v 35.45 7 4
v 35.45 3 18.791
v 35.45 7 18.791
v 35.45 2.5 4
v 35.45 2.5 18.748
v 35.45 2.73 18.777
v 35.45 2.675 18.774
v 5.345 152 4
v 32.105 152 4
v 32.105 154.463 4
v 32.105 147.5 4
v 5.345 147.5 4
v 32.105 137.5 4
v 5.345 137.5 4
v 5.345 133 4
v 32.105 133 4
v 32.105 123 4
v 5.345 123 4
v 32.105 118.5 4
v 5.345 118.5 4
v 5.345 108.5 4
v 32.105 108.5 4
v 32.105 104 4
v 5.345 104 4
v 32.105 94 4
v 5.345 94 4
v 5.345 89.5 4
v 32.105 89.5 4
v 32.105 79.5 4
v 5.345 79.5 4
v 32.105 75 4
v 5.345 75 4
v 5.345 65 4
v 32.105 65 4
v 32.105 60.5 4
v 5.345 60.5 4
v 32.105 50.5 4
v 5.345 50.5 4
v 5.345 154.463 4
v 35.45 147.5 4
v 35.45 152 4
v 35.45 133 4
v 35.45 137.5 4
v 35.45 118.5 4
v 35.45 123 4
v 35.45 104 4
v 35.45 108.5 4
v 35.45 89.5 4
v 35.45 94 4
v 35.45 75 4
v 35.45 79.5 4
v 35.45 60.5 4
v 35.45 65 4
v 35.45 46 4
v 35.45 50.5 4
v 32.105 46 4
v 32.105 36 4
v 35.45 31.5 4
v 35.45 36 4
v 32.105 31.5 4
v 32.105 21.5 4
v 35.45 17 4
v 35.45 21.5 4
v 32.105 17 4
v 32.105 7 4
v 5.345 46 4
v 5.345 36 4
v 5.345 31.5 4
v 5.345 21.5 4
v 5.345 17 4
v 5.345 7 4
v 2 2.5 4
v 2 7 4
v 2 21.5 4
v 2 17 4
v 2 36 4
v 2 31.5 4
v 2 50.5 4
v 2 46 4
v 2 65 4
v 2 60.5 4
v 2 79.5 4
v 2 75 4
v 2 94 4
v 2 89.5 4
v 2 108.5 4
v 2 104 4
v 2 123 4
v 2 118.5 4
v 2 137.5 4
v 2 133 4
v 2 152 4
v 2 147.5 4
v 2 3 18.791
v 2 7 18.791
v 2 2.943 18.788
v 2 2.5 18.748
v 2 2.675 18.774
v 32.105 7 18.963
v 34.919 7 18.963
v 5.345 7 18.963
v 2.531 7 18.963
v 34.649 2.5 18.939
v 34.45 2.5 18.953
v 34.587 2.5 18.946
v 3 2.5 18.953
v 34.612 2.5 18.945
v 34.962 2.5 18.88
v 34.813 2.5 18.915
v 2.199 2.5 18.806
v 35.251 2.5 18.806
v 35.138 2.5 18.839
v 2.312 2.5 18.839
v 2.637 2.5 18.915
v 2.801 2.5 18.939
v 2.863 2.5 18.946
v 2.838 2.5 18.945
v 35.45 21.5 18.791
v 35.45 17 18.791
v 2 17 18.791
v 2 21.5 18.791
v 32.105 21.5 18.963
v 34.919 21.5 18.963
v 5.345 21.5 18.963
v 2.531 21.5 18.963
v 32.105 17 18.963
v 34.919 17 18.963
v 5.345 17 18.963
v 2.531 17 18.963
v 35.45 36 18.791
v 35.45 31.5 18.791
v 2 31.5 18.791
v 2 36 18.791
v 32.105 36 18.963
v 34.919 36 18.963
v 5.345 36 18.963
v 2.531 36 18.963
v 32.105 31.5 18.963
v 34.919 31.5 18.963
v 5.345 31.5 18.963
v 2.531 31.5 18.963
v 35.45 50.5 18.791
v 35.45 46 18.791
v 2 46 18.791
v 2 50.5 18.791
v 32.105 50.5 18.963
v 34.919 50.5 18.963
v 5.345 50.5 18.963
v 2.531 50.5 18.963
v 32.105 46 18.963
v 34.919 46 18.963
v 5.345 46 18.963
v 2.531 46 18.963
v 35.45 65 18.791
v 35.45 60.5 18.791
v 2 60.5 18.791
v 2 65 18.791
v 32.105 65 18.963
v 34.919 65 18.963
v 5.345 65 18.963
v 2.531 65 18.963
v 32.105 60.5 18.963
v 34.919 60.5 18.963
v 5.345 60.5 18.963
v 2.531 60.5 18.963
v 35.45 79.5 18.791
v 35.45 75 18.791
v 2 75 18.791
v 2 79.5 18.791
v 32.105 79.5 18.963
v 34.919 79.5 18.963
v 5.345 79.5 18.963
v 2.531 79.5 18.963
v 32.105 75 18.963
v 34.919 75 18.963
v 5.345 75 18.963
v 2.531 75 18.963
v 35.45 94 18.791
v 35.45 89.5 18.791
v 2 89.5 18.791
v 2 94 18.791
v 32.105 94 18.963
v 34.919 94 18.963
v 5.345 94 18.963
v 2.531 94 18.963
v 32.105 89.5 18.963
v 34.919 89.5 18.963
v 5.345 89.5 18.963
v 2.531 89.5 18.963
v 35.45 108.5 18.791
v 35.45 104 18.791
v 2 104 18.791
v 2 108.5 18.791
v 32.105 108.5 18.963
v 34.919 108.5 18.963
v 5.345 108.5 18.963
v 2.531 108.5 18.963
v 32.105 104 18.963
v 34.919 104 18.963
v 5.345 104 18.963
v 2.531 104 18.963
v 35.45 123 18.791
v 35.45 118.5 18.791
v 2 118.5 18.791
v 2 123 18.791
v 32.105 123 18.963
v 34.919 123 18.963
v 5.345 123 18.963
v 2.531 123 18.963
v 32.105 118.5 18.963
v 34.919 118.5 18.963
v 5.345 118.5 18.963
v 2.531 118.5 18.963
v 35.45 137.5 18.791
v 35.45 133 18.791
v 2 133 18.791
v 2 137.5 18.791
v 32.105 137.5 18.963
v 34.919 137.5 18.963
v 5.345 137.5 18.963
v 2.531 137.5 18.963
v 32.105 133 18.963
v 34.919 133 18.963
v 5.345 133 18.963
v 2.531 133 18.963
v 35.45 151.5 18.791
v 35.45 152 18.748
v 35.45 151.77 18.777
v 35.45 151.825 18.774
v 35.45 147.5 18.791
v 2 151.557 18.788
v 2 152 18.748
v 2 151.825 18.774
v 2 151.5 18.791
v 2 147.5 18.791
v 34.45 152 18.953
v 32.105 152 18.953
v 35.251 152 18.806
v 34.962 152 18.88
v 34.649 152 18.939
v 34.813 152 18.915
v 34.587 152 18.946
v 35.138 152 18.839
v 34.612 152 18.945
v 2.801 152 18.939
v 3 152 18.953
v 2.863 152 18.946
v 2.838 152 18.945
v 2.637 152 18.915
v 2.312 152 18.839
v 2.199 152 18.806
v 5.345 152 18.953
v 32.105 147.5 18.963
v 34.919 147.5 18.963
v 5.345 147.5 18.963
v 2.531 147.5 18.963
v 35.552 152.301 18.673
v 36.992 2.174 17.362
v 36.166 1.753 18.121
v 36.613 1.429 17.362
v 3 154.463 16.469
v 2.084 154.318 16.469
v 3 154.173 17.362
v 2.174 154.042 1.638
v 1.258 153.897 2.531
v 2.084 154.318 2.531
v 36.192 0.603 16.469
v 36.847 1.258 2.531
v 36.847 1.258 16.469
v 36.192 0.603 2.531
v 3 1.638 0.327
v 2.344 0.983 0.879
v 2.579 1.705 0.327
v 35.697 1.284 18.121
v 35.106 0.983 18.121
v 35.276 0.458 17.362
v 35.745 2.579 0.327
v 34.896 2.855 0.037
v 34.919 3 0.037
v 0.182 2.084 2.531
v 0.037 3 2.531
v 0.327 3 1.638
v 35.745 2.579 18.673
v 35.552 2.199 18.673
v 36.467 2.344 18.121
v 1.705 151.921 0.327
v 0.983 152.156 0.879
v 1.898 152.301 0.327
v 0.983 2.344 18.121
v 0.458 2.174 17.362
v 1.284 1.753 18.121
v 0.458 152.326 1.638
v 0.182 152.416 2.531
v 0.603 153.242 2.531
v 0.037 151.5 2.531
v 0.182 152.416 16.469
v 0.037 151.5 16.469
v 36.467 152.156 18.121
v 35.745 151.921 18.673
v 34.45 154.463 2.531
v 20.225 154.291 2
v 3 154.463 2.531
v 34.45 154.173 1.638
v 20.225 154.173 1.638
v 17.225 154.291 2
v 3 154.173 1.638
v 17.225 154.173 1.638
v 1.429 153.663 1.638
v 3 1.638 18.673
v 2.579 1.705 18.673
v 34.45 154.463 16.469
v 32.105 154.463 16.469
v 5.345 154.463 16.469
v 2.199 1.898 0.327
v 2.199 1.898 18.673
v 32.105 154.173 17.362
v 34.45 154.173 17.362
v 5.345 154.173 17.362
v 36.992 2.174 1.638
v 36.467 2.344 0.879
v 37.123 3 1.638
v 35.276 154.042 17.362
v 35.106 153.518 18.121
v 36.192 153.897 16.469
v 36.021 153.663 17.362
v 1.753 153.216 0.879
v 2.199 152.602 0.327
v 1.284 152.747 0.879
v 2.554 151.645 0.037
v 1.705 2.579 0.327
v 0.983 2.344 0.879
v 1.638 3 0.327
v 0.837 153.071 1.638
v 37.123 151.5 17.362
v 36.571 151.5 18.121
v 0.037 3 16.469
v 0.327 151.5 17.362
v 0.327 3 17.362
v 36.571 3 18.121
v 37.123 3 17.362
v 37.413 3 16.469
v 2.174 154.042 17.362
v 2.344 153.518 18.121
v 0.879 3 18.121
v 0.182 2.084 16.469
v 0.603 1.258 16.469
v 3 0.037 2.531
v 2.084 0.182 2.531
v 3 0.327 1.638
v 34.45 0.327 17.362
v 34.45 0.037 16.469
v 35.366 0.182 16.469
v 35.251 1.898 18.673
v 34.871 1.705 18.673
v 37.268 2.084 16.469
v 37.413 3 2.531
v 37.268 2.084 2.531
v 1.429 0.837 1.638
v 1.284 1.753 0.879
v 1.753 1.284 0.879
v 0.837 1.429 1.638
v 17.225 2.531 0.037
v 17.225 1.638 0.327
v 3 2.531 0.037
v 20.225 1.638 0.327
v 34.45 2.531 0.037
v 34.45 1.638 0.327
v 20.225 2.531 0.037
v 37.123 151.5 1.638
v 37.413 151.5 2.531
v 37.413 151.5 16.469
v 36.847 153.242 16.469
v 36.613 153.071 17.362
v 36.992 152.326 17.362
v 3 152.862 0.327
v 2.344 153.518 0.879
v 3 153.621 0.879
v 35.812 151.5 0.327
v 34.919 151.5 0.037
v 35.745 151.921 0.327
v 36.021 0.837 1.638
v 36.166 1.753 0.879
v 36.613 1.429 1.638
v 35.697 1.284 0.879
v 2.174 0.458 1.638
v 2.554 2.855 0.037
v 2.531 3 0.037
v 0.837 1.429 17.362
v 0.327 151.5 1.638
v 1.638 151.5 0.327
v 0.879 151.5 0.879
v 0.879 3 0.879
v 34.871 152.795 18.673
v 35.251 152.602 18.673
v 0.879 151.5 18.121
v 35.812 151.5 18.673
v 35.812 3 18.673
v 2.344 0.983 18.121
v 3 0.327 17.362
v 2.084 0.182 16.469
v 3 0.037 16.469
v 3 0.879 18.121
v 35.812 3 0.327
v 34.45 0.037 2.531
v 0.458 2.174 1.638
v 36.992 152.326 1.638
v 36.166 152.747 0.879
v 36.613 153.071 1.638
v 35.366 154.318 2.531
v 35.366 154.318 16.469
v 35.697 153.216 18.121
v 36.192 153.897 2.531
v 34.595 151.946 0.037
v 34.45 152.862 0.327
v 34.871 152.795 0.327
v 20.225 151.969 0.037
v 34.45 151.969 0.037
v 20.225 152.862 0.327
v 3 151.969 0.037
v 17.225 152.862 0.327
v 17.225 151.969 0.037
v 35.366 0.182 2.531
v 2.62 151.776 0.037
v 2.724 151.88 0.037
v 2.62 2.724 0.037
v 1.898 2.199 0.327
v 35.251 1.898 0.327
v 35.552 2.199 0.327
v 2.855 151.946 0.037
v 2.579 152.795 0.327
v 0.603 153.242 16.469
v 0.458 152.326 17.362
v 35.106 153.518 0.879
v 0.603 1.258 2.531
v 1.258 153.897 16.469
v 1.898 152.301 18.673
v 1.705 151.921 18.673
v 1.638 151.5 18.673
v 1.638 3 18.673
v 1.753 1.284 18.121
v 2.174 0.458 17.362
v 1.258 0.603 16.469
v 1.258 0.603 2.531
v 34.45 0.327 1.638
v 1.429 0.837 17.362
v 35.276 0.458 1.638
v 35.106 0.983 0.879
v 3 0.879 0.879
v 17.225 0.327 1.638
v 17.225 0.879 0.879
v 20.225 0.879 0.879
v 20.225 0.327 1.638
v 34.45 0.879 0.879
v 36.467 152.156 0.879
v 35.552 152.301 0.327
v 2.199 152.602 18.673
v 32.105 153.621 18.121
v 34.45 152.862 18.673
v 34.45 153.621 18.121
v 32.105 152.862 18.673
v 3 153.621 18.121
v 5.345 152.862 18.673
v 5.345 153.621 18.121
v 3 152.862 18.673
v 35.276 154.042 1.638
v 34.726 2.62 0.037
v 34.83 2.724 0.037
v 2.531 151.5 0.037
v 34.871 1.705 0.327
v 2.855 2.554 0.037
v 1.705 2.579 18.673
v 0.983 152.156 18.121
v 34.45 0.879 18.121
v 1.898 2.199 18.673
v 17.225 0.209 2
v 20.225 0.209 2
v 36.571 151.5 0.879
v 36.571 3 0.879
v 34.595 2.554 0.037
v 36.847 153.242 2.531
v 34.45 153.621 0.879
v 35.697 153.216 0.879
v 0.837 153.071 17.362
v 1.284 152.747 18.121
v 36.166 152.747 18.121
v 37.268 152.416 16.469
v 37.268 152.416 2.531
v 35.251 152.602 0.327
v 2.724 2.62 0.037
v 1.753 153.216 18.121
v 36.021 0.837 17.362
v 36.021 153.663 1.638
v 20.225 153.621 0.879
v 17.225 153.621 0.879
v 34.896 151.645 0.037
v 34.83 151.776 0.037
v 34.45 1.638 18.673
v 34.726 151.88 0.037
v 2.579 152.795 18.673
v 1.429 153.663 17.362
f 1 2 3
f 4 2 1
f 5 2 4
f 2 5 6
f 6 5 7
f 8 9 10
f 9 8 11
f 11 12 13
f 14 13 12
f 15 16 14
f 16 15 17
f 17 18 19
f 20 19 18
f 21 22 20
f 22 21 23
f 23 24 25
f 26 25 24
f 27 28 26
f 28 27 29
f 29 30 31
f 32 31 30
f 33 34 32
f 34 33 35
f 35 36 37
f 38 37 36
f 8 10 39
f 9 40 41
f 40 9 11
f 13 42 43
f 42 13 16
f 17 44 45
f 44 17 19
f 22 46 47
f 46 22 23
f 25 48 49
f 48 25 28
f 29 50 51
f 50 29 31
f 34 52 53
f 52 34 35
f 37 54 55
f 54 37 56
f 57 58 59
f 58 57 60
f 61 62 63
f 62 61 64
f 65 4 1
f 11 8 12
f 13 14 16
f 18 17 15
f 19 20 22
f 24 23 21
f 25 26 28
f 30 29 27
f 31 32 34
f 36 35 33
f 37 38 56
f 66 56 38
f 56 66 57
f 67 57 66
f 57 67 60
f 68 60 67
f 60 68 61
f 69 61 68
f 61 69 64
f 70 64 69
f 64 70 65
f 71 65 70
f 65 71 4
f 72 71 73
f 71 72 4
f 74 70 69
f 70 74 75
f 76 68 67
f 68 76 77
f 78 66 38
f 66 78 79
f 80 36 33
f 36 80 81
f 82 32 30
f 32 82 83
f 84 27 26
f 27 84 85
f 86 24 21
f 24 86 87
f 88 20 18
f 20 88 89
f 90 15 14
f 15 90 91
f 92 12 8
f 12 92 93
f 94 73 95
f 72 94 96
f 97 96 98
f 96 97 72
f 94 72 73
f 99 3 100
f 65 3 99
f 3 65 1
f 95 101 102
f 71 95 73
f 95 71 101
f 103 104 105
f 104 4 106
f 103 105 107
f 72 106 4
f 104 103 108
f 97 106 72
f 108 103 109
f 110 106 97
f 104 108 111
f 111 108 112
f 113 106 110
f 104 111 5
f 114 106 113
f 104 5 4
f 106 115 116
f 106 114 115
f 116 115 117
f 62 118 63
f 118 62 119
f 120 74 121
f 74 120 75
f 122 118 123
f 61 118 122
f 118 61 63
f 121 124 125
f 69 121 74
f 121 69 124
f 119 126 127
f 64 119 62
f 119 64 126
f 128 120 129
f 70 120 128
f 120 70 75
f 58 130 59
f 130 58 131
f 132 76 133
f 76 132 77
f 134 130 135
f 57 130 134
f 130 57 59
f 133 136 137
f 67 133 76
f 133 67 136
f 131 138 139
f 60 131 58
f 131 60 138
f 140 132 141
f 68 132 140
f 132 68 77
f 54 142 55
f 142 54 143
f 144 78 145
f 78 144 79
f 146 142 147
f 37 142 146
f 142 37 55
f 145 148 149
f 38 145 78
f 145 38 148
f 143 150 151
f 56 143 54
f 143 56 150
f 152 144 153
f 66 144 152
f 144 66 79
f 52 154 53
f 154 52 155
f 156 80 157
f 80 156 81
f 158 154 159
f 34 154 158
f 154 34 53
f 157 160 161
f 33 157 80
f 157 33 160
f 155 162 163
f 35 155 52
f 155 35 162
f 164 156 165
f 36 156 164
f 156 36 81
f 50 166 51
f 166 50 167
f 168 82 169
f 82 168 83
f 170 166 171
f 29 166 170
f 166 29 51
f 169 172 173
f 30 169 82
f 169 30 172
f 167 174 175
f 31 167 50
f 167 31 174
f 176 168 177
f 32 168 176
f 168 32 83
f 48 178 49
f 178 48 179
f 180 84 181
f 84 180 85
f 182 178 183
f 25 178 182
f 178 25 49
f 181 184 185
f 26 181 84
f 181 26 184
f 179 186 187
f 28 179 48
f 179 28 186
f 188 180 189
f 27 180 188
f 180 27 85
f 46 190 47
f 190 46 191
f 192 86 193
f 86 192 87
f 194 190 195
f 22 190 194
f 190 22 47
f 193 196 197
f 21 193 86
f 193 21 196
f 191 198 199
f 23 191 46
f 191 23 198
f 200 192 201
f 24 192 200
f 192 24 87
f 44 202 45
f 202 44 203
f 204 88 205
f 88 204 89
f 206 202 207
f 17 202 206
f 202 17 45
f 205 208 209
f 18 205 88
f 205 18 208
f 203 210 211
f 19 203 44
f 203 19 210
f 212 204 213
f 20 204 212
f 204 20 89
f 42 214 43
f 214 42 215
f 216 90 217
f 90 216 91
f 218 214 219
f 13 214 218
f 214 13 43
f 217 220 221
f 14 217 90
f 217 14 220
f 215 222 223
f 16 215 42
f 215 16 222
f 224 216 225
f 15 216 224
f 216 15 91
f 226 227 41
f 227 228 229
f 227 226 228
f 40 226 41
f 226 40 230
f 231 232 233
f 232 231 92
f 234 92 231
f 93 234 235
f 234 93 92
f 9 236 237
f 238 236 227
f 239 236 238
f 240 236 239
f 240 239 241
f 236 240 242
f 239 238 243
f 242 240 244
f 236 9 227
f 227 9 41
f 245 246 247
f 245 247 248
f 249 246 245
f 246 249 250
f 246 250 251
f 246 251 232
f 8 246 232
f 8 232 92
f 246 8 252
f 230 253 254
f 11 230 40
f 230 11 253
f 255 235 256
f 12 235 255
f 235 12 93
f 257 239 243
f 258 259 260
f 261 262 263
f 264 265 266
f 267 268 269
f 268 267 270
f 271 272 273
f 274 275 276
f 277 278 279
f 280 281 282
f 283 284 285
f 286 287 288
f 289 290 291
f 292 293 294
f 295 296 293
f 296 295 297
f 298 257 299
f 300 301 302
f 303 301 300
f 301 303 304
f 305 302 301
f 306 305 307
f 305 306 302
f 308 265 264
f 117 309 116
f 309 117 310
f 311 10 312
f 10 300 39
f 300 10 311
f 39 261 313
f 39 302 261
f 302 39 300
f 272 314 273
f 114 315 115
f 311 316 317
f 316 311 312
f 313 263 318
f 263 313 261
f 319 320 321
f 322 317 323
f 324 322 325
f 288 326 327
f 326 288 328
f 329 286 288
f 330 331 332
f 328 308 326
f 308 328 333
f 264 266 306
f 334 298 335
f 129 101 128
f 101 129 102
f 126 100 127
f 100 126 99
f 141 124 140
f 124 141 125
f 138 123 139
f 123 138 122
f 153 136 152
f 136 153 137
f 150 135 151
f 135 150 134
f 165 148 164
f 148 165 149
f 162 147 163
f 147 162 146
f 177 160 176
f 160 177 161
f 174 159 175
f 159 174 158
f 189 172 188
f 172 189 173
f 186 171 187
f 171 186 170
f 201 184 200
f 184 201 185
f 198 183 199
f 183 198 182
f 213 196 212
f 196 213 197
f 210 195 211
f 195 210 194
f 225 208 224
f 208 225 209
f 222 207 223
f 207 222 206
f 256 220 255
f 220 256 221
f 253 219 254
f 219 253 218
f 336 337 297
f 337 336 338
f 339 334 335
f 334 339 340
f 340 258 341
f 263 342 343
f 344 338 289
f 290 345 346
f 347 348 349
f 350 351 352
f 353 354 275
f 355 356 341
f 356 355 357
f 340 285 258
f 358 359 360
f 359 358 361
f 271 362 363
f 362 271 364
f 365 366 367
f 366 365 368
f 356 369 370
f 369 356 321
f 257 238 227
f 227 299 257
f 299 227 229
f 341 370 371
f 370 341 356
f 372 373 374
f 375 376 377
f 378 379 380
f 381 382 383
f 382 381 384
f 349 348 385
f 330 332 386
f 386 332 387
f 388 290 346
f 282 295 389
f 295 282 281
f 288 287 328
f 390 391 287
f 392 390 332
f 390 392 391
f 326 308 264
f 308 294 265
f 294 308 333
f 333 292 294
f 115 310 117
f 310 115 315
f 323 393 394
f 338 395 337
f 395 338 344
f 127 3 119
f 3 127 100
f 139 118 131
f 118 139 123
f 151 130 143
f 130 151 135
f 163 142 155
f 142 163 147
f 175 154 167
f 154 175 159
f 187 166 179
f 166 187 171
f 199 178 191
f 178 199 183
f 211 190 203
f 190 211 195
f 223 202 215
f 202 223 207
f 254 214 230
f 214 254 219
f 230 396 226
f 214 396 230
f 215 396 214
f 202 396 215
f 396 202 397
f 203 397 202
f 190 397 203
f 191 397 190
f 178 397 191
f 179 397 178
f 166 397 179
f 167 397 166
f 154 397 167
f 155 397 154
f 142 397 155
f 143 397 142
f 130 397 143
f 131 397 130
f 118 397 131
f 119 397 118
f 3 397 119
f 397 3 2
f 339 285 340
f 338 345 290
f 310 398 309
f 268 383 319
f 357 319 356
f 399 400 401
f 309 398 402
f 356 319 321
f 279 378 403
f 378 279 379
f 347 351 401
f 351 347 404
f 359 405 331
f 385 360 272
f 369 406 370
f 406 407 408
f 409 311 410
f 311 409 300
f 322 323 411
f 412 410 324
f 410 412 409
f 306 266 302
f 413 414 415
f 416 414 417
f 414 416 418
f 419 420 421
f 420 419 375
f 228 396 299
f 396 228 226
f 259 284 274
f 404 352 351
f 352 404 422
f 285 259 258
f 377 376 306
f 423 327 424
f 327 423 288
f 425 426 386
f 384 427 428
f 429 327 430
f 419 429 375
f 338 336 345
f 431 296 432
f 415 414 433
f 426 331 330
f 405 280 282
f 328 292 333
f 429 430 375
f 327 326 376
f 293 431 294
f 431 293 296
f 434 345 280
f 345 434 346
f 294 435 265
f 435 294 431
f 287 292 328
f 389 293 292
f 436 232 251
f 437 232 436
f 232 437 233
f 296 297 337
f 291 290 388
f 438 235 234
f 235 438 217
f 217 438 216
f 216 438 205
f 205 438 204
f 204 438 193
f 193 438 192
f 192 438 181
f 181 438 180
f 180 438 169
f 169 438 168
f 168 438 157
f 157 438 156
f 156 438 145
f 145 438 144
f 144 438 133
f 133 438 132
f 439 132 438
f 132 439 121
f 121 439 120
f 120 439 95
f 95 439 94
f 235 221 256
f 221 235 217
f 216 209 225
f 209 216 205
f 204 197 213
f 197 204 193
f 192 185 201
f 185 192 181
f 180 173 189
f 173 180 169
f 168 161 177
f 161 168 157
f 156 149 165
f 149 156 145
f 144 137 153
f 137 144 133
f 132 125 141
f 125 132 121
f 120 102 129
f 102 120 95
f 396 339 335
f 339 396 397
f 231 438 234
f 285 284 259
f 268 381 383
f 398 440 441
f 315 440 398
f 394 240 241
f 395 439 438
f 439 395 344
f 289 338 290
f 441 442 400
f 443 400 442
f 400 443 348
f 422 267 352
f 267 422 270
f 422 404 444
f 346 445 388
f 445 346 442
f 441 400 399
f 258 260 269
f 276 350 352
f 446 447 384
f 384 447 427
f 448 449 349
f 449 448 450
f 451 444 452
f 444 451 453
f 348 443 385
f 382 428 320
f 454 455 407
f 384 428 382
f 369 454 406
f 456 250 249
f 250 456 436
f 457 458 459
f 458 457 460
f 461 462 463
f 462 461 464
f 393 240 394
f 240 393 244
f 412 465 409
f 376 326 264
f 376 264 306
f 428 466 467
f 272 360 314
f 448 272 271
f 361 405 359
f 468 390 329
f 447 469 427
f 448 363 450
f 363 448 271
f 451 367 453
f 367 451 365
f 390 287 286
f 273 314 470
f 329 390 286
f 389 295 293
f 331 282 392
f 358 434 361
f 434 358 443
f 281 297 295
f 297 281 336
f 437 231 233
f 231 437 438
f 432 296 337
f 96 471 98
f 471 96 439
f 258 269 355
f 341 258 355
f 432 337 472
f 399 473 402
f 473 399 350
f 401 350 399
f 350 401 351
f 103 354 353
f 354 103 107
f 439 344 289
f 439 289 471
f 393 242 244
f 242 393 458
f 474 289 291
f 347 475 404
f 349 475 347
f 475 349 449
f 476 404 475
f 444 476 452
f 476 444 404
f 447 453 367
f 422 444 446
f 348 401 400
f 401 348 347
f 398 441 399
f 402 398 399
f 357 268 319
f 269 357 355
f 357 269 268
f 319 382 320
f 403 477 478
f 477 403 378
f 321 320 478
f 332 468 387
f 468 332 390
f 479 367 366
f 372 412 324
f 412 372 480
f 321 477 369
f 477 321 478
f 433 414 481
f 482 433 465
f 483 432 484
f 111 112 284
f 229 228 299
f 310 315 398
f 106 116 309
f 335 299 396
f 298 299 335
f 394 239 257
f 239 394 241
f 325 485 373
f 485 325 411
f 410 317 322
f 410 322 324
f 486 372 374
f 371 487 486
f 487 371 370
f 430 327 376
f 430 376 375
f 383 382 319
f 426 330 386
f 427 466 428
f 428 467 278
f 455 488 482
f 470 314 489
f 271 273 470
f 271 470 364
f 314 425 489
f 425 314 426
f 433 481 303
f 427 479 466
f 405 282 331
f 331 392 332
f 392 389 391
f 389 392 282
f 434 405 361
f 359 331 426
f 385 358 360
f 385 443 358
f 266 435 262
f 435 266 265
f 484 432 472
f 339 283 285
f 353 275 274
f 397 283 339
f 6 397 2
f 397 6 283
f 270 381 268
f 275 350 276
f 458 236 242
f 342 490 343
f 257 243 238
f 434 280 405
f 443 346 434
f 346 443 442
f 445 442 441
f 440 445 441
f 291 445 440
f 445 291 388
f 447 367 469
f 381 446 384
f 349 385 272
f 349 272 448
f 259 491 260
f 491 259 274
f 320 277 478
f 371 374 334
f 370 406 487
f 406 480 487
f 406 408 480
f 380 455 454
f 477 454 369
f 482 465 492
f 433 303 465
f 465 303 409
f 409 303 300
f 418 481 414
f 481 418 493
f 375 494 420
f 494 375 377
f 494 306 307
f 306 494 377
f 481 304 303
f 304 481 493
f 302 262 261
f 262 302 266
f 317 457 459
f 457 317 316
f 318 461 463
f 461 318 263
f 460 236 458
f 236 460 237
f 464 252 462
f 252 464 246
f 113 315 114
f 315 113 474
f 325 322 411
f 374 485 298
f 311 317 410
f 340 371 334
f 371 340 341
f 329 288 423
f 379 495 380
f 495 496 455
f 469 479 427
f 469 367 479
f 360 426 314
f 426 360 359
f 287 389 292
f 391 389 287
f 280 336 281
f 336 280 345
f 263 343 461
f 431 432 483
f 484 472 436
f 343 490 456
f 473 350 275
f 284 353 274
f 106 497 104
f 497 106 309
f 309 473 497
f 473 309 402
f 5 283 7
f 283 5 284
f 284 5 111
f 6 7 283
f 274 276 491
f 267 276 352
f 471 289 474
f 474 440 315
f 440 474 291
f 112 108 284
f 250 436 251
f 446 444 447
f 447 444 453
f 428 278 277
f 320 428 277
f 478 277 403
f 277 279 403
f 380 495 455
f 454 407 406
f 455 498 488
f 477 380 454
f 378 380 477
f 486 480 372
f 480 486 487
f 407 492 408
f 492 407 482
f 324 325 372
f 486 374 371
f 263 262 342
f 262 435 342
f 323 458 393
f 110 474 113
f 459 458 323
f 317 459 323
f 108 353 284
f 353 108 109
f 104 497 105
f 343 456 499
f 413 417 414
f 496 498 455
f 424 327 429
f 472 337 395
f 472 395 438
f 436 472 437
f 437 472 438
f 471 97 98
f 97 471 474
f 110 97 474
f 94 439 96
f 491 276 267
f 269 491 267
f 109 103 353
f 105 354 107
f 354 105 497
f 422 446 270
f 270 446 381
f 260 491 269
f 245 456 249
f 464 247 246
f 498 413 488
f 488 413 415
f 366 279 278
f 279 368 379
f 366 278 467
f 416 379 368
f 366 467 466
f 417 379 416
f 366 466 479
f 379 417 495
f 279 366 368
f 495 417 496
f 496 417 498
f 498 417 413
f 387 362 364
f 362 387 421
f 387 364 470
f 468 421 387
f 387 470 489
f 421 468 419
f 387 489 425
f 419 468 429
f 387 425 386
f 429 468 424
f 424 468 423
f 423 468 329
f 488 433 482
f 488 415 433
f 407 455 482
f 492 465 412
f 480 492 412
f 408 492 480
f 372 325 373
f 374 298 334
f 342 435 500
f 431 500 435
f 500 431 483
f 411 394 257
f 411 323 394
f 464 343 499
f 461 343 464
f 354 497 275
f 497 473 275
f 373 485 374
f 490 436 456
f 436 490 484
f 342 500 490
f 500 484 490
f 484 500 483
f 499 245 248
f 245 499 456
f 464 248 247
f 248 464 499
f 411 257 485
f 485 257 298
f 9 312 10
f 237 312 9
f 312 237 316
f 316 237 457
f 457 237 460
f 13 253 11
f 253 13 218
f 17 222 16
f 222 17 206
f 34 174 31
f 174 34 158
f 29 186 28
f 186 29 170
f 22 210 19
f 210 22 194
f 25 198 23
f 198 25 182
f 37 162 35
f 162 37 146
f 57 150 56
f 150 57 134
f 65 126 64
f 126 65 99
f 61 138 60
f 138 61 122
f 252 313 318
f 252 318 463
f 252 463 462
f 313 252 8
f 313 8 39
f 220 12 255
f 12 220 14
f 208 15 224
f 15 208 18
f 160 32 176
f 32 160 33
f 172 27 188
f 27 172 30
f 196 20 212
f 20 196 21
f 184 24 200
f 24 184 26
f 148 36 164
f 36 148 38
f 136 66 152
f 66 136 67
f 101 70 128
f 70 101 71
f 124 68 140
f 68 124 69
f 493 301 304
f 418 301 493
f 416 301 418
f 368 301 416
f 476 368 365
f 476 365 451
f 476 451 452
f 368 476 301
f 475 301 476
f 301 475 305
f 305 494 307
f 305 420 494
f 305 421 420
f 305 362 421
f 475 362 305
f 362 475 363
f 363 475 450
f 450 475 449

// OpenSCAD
//Constants
stuffz = 2/1;
fuzz = 0.2/1+.5;
real_card_length = 34.95/1;
real_card_width = 32.75/1;
real_card_thick = 3.8/1;
card_length = real_card_length + fuzz;
card_width = real_card_width + fuzz;
card_thick = real_card_thick + fuzz;

//DS Box
number_of_cards = 11; //[1:20]
box_height_addition = 15; //[10: 32]
gutter_height = 2; //[1:5]
gutter_width = 3; //[1:5]
card_spacing = 10; //[2:10]
card_spacing_ends = 2.5;
$fn = 20;
cube_r = 3; //[1 : 5]

box(number_of_cards);

//----------------------------

module card()
{
  cube([card_width,card_thick,card_length]);
}

module box(number)
{
  	box_x = card_width + stuffz*2;
  	box_y = 2*card_spacing_ends - card_spacing + (card_thick + card_spacing) * number;
  	box_z = gutter_height+ stuffz + box_height_addition;
  	card_x_trans = box_x / 2 - card_width /2;
 
	cutout=0.80/1;
 	//%cube([box_x, box_y, box_z]);

  	difference()
	{
    	roundCornerCube(box_x,box_y,box_z,cube_r);

		//hollow out
		translate([card_x_trans+card_width*(1-cutout)/2, card_spacing_ends,gutter_height+stuffz]) 
			cube([card_width*cutout, (card_thick + card_spacing) * number , box_z]);

    	//gutter
    	translate([(box_x/2) - (gutter_width/2),-fuzz,-fuzz]) 
			cube([gutter_width, box_y + (fuzz*2),gutter_height+fuzz]);

    	//cards
    	for (i = [0 : number-1])
		{
      		translate([card_x_trans, card_spacing_ends + (card_thick + card_spacing)*i,gutter_height+stuffz]) 
				rotate([0,0,0]) card();
    	}

  	}
}

module roundCornerCube(x,y,z,r_sphere)
{
r = r_sphere;
if (x < r) {echo ("roundCornerCube: error: x < r !!");}
if (y < r) {echo ("roundCornerCube: error: y < r !!");}
if (z < r) {echo ("roundCornerCube: error: z < r !!");}
	hull(){
		translate([r,y-r,z-r]) sphere(r_sphere); //1!
		translate([x-r,y-r,z-r]) sphere(r_sphere); //2
		translate([r,r,z-r]) sphere(r_sphere); //3
		translate([x-r,r,z-r]) sphere(r_sphere); //4
		translate([r,y-r,r]) sphere(r_sphere); //5!
		translate([x-r,y-r,r]) sphere(r_sphere); //6		
		translate([r,r,r]) sphere(r_sphere); //7
		translate([x-r,r,r]) sphere(r_sphere); //8
	}
}
